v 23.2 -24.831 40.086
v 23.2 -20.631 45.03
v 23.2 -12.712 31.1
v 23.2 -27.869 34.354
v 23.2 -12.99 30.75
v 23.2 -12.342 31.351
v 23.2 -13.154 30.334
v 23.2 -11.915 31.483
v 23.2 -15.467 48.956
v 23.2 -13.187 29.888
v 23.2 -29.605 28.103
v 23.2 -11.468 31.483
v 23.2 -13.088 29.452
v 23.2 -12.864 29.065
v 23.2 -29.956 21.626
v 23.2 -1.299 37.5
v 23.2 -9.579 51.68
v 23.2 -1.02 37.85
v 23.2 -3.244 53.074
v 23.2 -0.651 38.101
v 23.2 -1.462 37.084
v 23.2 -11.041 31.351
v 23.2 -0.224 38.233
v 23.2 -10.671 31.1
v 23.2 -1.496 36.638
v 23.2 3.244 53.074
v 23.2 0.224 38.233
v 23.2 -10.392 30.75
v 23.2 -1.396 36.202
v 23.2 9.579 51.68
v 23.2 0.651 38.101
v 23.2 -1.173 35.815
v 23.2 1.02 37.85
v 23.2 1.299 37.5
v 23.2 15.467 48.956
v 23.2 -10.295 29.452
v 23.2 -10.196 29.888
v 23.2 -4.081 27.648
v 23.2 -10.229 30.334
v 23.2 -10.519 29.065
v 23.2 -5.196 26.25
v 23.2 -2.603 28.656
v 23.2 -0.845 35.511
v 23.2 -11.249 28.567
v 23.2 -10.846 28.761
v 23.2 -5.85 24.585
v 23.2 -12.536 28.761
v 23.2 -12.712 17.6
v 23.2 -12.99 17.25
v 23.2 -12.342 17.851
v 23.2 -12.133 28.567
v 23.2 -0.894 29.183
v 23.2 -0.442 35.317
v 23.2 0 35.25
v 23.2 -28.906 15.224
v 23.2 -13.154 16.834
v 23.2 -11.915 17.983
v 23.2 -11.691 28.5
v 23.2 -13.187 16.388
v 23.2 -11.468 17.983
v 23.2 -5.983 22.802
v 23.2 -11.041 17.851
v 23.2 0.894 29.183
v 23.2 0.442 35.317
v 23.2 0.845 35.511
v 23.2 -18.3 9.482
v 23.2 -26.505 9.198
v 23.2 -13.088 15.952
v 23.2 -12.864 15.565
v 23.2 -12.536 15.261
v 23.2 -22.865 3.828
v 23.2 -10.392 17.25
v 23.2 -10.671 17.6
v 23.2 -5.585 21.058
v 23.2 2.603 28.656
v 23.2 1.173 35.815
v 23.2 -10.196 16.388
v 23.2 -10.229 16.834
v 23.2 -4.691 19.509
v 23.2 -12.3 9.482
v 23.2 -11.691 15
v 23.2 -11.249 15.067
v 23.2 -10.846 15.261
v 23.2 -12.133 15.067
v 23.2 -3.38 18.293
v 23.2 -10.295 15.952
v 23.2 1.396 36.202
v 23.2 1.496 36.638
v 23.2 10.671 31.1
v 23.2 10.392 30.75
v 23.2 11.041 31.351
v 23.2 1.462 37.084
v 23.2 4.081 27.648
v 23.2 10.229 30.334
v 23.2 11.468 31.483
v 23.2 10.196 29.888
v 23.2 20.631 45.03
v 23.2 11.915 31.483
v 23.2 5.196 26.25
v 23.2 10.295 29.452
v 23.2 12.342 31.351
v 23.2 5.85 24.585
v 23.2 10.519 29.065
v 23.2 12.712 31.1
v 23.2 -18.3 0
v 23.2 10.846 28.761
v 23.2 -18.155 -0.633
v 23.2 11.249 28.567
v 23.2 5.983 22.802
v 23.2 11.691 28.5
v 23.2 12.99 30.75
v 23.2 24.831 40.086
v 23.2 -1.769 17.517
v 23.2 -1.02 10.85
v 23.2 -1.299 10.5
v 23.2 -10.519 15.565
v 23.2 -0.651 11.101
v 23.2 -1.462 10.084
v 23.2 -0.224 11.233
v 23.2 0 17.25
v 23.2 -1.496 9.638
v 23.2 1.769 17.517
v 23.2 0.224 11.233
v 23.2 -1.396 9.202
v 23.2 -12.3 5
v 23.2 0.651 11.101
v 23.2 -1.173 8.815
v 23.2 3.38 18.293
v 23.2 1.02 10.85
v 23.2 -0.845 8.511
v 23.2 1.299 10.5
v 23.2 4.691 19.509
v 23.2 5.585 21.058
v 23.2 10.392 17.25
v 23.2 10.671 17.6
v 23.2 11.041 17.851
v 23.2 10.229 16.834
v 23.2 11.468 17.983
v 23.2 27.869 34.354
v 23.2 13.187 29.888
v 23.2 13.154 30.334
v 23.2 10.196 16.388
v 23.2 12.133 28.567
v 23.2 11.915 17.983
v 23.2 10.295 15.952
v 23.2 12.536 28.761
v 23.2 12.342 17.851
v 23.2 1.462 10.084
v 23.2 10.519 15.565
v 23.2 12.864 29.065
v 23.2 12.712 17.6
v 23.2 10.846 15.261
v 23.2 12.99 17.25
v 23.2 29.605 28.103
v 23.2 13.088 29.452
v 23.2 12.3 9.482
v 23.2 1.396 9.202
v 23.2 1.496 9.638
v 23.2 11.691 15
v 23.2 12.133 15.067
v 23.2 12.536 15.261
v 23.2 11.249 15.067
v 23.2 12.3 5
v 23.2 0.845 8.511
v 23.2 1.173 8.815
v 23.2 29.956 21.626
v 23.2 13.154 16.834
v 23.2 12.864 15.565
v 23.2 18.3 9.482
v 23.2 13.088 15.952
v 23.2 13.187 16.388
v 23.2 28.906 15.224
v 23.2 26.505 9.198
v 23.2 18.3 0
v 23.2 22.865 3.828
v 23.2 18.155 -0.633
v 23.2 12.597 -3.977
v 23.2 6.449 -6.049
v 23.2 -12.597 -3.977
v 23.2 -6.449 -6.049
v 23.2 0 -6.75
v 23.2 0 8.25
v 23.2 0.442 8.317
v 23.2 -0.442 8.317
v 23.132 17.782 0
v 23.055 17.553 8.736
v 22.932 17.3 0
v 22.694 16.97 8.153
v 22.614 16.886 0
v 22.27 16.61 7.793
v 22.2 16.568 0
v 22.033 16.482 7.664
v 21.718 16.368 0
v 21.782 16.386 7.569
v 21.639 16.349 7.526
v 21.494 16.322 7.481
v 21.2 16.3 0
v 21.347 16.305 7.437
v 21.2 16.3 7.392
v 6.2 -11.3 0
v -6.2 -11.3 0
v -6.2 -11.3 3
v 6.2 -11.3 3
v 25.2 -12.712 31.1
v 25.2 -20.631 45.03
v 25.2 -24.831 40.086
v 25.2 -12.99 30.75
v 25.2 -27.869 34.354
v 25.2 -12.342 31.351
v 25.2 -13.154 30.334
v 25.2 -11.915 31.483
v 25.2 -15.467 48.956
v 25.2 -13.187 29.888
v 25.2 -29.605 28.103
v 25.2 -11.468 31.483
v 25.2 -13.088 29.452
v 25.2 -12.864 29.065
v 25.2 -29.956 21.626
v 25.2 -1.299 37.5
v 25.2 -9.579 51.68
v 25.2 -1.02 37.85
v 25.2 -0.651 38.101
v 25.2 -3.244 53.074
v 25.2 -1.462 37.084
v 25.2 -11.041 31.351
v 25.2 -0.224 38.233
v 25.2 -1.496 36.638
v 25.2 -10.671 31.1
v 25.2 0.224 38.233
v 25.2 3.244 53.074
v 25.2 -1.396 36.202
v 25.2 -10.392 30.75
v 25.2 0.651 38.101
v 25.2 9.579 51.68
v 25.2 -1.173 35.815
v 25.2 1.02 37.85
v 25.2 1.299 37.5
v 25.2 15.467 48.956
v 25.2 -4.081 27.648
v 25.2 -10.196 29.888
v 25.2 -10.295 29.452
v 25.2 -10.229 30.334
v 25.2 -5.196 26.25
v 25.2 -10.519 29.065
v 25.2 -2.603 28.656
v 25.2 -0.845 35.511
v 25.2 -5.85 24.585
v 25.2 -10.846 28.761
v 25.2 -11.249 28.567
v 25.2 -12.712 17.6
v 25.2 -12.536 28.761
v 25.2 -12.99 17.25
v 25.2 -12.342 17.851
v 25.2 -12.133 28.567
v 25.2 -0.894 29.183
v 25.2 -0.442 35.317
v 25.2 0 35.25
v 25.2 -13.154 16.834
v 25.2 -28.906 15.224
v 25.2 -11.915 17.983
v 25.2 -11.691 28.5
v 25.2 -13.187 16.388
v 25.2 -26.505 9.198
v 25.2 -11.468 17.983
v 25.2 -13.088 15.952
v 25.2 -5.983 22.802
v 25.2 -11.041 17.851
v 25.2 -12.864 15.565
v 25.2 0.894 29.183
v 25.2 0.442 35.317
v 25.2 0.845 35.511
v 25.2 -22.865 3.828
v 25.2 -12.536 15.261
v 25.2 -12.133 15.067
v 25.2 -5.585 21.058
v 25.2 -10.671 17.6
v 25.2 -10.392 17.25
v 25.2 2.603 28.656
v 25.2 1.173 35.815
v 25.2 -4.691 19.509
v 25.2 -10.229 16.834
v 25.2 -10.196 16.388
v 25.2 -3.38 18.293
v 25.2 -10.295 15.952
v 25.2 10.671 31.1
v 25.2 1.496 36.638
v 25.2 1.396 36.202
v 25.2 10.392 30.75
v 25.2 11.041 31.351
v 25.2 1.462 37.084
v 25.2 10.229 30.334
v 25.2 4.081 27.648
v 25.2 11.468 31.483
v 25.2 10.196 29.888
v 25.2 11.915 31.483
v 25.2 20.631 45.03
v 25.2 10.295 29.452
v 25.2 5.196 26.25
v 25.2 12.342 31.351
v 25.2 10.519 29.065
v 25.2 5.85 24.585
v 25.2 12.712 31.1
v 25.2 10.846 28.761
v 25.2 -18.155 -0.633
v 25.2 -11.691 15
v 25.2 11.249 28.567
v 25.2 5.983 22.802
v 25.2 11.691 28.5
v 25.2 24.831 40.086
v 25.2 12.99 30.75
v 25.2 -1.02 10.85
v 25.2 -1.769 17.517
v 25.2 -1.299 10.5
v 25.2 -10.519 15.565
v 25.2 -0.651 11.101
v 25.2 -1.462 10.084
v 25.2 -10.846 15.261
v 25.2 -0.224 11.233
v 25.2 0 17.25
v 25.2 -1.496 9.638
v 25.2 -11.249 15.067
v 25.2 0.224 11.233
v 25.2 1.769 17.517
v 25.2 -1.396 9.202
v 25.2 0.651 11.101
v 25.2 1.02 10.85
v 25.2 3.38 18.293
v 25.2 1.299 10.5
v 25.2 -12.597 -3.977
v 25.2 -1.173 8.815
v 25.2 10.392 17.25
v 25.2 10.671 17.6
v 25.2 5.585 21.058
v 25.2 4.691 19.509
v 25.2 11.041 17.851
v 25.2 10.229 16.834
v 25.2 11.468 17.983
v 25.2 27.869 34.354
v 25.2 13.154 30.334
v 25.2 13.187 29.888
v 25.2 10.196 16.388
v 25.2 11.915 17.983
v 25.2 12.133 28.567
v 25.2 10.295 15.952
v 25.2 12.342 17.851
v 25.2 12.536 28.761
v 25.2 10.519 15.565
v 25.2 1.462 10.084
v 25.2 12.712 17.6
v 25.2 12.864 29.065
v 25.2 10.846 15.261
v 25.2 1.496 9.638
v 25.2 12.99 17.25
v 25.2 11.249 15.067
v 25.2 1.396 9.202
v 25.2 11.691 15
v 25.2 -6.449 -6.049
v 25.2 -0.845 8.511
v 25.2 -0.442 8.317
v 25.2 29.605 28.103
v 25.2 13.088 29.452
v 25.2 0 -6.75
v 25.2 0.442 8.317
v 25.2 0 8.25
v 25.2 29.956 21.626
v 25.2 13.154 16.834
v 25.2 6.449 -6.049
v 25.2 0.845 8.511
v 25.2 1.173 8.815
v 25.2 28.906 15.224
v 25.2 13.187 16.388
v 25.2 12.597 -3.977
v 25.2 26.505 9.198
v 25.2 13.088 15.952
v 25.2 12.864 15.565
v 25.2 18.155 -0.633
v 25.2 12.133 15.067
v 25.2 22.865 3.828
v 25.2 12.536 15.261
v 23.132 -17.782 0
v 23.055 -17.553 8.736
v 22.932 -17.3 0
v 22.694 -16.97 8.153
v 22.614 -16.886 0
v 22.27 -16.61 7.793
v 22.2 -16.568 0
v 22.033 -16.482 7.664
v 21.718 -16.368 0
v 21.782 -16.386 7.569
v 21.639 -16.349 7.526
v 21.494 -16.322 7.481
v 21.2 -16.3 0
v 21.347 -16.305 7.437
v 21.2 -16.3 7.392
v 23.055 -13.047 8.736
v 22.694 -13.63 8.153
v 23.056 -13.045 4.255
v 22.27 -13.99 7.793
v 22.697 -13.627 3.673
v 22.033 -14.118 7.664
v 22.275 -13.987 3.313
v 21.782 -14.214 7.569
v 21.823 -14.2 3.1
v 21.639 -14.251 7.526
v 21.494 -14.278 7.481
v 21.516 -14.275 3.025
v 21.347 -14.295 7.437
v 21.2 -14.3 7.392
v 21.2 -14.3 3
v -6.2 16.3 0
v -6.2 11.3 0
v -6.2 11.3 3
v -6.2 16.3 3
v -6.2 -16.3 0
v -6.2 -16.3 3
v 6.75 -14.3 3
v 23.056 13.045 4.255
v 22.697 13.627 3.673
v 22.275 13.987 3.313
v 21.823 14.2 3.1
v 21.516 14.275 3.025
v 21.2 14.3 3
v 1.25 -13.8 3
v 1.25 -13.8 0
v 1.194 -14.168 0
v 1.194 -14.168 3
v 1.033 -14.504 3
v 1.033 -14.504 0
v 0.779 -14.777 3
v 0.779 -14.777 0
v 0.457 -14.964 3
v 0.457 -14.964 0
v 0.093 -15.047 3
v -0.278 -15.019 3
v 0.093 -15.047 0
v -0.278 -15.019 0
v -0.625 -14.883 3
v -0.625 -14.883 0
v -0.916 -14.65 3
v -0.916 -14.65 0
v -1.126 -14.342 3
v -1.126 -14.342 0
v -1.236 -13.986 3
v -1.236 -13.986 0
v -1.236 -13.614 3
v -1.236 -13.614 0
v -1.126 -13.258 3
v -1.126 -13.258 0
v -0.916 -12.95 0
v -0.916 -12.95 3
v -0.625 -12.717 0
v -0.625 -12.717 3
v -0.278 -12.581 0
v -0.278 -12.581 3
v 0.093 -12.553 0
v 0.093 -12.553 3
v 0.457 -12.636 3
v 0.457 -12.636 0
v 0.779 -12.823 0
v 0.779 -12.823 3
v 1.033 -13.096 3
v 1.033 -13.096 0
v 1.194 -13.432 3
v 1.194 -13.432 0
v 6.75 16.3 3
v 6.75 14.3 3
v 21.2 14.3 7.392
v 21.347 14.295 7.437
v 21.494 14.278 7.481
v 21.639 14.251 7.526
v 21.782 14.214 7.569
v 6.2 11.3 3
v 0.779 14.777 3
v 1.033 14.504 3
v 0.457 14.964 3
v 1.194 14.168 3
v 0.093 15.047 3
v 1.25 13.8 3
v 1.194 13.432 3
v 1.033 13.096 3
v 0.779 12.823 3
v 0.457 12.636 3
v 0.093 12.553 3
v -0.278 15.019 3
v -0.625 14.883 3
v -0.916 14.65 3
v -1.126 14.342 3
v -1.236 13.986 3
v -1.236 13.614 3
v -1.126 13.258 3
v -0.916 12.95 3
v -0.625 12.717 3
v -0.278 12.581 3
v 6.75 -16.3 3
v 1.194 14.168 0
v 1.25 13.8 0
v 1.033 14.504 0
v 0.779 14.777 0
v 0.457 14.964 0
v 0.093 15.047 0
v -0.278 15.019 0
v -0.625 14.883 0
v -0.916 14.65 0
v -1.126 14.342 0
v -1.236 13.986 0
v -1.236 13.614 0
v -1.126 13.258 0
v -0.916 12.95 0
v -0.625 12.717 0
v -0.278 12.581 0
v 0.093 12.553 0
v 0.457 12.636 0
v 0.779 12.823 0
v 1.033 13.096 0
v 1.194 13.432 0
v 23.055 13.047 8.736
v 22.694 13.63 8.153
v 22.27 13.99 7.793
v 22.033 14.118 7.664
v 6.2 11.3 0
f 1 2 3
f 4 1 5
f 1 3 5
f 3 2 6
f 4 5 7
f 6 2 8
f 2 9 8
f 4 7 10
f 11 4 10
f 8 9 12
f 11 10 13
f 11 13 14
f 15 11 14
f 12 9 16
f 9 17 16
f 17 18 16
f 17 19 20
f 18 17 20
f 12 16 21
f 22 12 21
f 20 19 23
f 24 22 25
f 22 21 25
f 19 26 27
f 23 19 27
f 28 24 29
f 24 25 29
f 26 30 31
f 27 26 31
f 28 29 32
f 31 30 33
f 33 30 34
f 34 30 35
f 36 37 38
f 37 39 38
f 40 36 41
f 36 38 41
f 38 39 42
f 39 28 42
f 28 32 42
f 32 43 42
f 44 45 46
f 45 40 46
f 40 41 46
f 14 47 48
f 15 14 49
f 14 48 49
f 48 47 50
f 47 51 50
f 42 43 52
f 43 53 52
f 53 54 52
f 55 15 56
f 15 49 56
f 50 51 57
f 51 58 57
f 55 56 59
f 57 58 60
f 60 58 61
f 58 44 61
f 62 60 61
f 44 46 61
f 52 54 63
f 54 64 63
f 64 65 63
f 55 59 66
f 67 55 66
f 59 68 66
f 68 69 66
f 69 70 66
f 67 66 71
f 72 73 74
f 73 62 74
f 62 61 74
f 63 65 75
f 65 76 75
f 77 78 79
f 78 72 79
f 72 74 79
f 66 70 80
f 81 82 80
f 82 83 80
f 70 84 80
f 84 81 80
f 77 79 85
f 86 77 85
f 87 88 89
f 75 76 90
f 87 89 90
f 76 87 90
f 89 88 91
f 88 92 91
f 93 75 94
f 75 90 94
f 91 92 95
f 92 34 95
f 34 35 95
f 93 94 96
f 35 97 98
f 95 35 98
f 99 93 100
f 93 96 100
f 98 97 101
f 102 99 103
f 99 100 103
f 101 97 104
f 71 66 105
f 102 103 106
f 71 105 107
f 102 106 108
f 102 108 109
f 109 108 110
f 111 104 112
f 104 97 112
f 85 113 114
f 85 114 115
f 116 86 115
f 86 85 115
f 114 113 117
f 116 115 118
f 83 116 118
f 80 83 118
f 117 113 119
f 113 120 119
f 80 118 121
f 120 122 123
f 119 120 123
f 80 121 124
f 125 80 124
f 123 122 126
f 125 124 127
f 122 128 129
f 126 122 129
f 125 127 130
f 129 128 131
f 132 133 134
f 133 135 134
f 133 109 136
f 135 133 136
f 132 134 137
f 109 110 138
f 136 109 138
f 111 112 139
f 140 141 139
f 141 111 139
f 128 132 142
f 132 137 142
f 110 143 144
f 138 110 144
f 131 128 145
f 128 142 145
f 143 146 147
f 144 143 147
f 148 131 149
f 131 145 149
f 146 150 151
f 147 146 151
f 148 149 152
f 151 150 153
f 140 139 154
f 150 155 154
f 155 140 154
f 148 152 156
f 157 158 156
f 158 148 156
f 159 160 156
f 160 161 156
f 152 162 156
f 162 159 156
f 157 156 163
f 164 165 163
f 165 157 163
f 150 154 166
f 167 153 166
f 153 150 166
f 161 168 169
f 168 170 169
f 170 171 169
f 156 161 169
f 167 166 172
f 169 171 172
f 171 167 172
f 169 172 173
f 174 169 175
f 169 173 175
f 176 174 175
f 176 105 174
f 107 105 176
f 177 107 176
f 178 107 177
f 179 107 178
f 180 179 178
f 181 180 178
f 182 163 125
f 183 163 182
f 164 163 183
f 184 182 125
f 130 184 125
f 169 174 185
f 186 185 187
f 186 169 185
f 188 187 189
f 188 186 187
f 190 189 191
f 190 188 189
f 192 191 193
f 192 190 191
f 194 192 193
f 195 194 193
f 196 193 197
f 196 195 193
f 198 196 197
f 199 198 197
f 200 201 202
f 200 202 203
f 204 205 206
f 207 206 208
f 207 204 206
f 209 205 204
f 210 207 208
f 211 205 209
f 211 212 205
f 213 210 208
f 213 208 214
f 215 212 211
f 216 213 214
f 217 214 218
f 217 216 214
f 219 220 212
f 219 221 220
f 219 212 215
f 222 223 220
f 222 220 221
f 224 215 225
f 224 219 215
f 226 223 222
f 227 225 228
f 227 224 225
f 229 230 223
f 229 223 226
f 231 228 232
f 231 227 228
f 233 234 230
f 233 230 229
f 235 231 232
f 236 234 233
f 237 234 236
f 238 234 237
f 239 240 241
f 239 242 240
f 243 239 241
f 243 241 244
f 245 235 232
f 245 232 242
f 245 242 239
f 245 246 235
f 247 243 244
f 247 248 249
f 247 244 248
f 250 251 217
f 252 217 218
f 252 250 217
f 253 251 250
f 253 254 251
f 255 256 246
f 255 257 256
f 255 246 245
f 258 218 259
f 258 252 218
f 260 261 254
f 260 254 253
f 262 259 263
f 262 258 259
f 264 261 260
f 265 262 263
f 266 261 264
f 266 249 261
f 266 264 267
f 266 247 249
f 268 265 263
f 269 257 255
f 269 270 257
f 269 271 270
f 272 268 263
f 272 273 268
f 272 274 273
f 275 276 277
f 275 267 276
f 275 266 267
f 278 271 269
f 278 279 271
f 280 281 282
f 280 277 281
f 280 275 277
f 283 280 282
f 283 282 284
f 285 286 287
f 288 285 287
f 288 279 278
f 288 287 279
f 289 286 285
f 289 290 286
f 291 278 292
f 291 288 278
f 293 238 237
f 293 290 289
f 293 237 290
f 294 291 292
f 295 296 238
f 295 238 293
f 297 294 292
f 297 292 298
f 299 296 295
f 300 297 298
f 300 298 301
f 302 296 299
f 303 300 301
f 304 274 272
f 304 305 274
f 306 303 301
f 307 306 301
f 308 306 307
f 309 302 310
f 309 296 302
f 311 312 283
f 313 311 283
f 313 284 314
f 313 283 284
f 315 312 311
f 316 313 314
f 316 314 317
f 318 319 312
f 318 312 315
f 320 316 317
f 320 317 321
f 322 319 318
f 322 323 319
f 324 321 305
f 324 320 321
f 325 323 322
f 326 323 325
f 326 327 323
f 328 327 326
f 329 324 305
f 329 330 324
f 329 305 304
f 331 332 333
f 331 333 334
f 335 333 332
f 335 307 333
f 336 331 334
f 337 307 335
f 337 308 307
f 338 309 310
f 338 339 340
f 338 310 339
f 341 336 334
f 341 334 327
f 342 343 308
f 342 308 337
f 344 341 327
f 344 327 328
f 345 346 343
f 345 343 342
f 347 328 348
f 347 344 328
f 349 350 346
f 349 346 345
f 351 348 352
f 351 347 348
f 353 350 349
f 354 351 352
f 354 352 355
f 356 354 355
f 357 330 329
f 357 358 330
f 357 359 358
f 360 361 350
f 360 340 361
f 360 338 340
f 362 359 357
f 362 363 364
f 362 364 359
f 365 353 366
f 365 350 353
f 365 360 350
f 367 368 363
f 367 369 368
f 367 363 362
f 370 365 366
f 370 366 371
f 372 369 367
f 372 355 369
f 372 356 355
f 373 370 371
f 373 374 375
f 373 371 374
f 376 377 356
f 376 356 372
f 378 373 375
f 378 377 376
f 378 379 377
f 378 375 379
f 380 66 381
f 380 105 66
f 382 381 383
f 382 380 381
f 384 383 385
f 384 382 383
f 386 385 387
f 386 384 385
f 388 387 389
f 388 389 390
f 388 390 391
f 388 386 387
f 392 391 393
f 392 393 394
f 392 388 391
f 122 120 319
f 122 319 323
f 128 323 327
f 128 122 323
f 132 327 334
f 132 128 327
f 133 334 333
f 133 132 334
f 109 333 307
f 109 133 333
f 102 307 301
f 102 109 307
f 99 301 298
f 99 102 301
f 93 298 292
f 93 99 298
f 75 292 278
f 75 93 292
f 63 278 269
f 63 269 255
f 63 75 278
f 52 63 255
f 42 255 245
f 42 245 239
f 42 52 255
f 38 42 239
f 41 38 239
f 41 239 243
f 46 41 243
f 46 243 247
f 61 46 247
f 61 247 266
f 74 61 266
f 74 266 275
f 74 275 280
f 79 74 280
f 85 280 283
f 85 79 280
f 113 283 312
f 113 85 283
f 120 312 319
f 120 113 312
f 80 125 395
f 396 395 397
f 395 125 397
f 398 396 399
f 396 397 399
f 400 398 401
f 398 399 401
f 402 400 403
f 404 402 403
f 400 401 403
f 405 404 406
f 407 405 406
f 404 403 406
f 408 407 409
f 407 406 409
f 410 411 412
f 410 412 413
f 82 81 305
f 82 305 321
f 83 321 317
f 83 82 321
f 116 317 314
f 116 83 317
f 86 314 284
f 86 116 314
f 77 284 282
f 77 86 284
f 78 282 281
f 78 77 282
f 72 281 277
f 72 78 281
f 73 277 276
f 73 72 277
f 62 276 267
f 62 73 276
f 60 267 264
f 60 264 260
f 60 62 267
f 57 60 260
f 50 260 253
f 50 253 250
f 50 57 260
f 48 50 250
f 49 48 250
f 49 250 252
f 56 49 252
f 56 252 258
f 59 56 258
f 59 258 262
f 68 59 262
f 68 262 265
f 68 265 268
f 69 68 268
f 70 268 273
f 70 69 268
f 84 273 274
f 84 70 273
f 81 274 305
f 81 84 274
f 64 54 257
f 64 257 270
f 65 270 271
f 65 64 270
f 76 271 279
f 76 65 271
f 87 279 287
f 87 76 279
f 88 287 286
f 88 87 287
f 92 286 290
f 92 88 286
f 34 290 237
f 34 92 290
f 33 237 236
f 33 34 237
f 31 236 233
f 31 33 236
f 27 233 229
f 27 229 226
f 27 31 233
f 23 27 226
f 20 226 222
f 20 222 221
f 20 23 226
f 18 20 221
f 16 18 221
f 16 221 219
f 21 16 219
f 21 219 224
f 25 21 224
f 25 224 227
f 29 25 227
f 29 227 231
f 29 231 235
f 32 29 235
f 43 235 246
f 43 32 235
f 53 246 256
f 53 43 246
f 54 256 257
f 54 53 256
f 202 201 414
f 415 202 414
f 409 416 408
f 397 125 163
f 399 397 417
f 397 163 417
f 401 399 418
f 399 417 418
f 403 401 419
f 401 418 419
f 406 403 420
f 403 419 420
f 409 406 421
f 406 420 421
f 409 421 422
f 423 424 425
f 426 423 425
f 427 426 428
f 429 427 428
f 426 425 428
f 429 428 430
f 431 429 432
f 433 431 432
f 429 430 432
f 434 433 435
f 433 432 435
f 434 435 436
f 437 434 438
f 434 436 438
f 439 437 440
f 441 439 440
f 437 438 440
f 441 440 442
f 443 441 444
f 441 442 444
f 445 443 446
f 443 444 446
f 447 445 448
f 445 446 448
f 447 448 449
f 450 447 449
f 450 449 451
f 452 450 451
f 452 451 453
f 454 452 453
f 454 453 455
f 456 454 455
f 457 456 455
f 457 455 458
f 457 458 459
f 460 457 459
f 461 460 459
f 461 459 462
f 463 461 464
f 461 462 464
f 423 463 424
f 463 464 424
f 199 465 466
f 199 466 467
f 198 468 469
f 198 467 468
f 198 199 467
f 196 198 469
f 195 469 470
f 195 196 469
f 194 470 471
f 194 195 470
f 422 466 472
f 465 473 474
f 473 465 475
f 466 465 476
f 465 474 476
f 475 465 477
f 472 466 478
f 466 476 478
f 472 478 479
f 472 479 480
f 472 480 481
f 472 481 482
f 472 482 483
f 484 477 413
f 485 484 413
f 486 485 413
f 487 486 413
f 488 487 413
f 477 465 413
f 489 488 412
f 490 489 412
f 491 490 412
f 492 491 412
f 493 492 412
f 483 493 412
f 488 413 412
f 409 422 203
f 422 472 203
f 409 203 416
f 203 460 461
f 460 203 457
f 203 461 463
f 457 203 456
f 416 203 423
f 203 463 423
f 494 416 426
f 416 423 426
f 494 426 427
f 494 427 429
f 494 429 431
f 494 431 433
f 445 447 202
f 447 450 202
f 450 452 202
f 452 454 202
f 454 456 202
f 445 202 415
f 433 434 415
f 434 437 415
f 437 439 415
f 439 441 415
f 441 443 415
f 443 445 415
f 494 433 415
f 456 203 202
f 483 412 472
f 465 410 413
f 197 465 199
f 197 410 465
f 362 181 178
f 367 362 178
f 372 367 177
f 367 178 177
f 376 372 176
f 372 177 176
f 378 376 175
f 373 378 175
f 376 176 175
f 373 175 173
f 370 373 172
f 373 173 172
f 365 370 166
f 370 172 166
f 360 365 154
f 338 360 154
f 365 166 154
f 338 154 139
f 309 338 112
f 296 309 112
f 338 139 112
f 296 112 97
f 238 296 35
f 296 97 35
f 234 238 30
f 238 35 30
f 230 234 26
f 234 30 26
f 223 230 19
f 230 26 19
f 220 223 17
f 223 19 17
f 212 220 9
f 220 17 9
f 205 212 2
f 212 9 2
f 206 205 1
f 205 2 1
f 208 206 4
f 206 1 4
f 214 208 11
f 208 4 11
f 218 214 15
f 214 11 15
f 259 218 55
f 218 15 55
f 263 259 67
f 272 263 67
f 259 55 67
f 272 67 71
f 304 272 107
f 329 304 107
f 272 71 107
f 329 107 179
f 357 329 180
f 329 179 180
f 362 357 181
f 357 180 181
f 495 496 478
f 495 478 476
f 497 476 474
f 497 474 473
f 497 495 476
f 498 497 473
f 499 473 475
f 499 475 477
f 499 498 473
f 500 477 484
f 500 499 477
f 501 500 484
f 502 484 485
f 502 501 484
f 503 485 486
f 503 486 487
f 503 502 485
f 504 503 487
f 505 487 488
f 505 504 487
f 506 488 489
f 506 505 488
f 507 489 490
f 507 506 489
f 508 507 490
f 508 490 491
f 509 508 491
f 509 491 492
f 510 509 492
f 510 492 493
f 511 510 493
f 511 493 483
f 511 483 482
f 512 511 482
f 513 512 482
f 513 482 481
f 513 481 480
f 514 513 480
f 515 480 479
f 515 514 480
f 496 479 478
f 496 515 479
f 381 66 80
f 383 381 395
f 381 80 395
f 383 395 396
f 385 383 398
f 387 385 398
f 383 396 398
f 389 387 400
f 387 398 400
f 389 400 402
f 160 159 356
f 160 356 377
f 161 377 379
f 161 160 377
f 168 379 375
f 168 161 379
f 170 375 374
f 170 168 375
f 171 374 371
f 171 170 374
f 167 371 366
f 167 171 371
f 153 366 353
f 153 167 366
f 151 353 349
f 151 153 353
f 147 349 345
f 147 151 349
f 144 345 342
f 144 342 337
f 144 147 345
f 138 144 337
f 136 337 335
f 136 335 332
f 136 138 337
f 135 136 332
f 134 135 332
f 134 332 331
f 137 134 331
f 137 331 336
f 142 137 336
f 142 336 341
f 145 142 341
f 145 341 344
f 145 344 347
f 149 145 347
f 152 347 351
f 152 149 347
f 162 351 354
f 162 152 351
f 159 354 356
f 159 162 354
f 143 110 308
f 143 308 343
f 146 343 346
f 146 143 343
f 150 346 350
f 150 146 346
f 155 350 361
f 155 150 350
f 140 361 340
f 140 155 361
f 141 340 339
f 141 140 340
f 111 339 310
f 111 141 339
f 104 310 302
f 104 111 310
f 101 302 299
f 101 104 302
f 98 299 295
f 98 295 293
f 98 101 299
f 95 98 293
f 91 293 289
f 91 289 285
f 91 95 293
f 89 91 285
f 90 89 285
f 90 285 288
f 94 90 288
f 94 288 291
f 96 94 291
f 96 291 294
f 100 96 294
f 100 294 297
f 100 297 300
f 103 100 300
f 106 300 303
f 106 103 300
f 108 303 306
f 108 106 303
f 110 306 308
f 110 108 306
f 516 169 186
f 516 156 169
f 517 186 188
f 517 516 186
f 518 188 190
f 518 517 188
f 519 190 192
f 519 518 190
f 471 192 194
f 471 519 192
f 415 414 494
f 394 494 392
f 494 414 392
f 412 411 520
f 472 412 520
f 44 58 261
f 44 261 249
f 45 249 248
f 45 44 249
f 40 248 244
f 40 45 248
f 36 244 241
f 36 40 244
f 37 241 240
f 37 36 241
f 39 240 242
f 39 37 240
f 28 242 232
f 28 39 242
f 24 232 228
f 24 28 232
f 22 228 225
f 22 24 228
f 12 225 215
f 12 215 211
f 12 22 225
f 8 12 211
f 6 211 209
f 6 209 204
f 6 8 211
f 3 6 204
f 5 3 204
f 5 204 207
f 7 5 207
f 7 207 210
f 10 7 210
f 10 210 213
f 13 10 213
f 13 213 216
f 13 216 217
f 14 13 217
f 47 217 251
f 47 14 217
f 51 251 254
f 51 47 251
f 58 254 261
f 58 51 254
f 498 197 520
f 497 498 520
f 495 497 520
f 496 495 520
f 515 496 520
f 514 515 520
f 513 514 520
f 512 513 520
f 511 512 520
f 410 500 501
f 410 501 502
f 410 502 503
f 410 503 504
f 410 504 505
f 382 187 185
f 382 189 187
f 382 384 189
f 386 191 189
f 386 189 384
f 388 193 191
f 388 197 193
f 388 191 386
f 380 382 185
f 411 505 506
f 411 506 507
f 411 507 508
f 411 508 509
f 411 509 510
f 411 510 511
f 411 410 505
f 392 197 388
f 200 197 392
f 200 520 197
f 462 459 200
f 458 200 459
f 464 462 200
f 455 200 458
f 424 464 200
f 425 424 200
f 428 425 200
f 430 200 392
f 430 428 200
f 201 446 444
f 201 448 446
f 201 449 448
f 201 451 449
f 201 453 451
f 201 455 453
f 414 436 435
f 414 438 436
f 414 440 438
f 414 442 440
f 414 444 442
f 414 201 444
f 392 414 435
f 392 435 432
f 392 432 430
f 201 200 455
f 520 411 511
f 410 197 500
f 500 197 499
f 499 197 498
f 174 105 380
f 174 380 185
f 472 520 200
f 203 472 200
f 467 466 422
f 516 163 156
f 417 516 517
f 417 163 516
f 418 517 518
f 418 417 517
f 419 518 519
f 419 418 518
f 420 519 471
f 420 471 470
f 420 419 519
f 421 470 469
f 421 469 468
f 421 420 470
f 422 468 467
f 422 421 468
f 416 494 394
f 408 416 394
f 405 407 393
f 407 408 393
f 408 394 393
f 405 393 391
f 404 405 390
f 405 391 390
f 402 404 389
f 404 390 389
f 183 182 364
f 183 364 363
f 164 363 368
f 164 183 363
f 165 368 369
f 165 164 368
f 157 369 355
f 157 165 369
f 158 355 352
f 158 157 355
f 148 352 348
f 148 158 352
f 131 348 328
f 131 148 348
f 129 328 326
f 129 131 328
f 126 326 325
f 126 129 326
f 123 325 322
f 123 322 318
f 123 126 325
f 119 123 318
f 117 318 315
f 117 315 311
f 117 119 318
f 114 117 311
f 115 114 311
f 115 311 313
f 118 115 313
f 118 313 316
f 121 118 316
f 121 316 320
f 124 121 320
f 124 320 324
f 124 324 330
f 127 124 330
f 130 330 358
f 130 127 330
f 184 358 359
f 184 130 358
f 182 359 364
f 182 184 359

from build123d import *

# Parameters (mm, degrees)
SKETCH_1_W      = 12.4
SKETCH_1_H      = 5
SKETCH_1_R      = 1.25
SKETCH_1_W_2    = 5
SKETCH_1_H_2    = 11.3
EXTRUDE_1_DEPTH = 3
SKETCH_2_W      = 3
SKETCH_2_H      = 16.3
EXTRUDE_2_DEPTH = 12
EXTRUDE_3_DEPTH = 2
SKETCH_4_R      = 30
SKETCH_4_R_2    = 1.5
SKETCH_4_R_3    = 6
EXTRUDE_4_DEPTH = 2
FILLET_2_R      = 2


with BuildPart() as part:
    # Эскиз1 → Бобышка-Вытянуть1 (new body)
    with BuildSketch(Plane.XY):
        with Locations((0, 13.8)):
            Rectangle(SKETCH_1_W, SKETCH_1_H)
        with Locations((0, 13.8)):
            Circle(SKETCH_1_R, mode=Mode.SUBTRACT)
        with Locations((8.7, 13.8)):
            Rectangle(SKETCH_1_W_2, SKETCH_1_H)
        with Locations((8.7, 5.65)):
            Rectangle(SKETCH_1_W_2, SKETCH_1_H_2)
    extrude_1 = extrude(amount=EXTRUDE_1_DEPTH)

    # Эскиз2 → Бобышка-Вытянуть2 (add)
    with BuildSketch(Plane(origin=(11.2, 0, 0), x_dir=(0, 0, -1), z_dir=(1, 0, 0))):
        with Locations((-1.5, 8.15)):
            Rectangle(SKETCH_2_W, SKETCH_2_H)
    extrude_2 = extrude(amount=EXTRUDE_2_DEPTH)

    # Эскиз3 → Бобышка-Вытянуть3 (add)
    with BuildSketch(Plane(origin=(0, 16.3, 0), x_dir=(1, 0, 0), z_dir=(0, 1, 0))):
        Polygon((23.2, -8), (23.2, -3), (6.75, -3), align=None)
    extrude_3 = extrude(amount=-EXTRUDE_3_DEPTH)

    # Зеркальное отражение1: Бобышка-Вытянуть1, Бобышка-Вытянуть2, Бобышка-Вытянуть3 across plane
    add(extrude_1.mirror(Plane(origin=(0, 0, 3), x_dir=(0, 0, 1), z_dir=(0, -1, 0))))
    add(extrude_2.mirror(Plane(origin=(0, 0, 3), x_dir=(0, 0, 1), z_dir=(0, -1, 0))))
    add(extrude_3.mirror(Plane(origin=(0, 0, 3), x_dir=(0, 0, 1), z_dir=(0, -1, 0))))

    # Эскиз4 → Бобышка-Вытянуть4 (add)
    with BuildSketch(Plane(origin=(23.2, 0, 0), x_dir=(0, 0, -1), z_dir=(1, 0, 0))):
        with Locations((-23.25, 0)):
            Circle(SKETCH_4_R)
        with Locations((-30, -11.691342951)):
            Circle(SKETCH_4_R_2, mode=Mode.SUBTRACT)
        with Locations((-16.5, 11.691342951)):
            Circle(SKETCH_4_R_2, mode=Mode.SUBTRACT)
        with Locations((-9.75, 0)):
            Circle(SKETCH_4_R_2, mode=Mode.SUBTRACT)
        with Locations((-36.75, 0)):
            Circle(SKETCH_4_R_2, mode=Mode.SUBTRACT)
        with Locations((-16.5, -11.691342951)):
            Circle(SKETCH_4_R_2, mode=Mode.SUBTRACT)
        with Locations((-30, 11.691342951)):
            Circle(SKETCH_4_R_2, mode=Mode.SUBTRACT)
        with Locations((-23.25, 0)):
            Circle(SKETCH_4_R_3, mode=Mode.SUBTRACT)
        Polygon((-3, 14.3), (-3, -14.3), (-8, -14.3), (-8, -16.3), (0, -16.3), (0, 16.3), (-8, 16.3), (-8, 14.3), align=None, mode=Mode.SUBTRACT)
        Polygon((-8, 14.3), (-3, 14.3), (-3, -14.3), (-8, -14.3), (-8, -16.3), (0, -16.3), (0, 16.3), (-8, 16.3), align=None)
    extrude(amount=EXTRUDE_4_DEPTH)

    # Скругление2
    fillet_2_edges = [part.edges().sort_by_distance(p)[0] for p in [
        (23.2, 16.3, 4),
        (23.2, 0, 3),
        (23.2, 15.3, 8),
        (23.2, 14.3, 5.5),
        (23.2, -16.3, 4),
        (23.2, -14.3, 5.5),
        (23.2, -15.3, 8),
    ]]
    fillet(fillet_2_edges, radius=FILLET_2_R)


solid = part.part
